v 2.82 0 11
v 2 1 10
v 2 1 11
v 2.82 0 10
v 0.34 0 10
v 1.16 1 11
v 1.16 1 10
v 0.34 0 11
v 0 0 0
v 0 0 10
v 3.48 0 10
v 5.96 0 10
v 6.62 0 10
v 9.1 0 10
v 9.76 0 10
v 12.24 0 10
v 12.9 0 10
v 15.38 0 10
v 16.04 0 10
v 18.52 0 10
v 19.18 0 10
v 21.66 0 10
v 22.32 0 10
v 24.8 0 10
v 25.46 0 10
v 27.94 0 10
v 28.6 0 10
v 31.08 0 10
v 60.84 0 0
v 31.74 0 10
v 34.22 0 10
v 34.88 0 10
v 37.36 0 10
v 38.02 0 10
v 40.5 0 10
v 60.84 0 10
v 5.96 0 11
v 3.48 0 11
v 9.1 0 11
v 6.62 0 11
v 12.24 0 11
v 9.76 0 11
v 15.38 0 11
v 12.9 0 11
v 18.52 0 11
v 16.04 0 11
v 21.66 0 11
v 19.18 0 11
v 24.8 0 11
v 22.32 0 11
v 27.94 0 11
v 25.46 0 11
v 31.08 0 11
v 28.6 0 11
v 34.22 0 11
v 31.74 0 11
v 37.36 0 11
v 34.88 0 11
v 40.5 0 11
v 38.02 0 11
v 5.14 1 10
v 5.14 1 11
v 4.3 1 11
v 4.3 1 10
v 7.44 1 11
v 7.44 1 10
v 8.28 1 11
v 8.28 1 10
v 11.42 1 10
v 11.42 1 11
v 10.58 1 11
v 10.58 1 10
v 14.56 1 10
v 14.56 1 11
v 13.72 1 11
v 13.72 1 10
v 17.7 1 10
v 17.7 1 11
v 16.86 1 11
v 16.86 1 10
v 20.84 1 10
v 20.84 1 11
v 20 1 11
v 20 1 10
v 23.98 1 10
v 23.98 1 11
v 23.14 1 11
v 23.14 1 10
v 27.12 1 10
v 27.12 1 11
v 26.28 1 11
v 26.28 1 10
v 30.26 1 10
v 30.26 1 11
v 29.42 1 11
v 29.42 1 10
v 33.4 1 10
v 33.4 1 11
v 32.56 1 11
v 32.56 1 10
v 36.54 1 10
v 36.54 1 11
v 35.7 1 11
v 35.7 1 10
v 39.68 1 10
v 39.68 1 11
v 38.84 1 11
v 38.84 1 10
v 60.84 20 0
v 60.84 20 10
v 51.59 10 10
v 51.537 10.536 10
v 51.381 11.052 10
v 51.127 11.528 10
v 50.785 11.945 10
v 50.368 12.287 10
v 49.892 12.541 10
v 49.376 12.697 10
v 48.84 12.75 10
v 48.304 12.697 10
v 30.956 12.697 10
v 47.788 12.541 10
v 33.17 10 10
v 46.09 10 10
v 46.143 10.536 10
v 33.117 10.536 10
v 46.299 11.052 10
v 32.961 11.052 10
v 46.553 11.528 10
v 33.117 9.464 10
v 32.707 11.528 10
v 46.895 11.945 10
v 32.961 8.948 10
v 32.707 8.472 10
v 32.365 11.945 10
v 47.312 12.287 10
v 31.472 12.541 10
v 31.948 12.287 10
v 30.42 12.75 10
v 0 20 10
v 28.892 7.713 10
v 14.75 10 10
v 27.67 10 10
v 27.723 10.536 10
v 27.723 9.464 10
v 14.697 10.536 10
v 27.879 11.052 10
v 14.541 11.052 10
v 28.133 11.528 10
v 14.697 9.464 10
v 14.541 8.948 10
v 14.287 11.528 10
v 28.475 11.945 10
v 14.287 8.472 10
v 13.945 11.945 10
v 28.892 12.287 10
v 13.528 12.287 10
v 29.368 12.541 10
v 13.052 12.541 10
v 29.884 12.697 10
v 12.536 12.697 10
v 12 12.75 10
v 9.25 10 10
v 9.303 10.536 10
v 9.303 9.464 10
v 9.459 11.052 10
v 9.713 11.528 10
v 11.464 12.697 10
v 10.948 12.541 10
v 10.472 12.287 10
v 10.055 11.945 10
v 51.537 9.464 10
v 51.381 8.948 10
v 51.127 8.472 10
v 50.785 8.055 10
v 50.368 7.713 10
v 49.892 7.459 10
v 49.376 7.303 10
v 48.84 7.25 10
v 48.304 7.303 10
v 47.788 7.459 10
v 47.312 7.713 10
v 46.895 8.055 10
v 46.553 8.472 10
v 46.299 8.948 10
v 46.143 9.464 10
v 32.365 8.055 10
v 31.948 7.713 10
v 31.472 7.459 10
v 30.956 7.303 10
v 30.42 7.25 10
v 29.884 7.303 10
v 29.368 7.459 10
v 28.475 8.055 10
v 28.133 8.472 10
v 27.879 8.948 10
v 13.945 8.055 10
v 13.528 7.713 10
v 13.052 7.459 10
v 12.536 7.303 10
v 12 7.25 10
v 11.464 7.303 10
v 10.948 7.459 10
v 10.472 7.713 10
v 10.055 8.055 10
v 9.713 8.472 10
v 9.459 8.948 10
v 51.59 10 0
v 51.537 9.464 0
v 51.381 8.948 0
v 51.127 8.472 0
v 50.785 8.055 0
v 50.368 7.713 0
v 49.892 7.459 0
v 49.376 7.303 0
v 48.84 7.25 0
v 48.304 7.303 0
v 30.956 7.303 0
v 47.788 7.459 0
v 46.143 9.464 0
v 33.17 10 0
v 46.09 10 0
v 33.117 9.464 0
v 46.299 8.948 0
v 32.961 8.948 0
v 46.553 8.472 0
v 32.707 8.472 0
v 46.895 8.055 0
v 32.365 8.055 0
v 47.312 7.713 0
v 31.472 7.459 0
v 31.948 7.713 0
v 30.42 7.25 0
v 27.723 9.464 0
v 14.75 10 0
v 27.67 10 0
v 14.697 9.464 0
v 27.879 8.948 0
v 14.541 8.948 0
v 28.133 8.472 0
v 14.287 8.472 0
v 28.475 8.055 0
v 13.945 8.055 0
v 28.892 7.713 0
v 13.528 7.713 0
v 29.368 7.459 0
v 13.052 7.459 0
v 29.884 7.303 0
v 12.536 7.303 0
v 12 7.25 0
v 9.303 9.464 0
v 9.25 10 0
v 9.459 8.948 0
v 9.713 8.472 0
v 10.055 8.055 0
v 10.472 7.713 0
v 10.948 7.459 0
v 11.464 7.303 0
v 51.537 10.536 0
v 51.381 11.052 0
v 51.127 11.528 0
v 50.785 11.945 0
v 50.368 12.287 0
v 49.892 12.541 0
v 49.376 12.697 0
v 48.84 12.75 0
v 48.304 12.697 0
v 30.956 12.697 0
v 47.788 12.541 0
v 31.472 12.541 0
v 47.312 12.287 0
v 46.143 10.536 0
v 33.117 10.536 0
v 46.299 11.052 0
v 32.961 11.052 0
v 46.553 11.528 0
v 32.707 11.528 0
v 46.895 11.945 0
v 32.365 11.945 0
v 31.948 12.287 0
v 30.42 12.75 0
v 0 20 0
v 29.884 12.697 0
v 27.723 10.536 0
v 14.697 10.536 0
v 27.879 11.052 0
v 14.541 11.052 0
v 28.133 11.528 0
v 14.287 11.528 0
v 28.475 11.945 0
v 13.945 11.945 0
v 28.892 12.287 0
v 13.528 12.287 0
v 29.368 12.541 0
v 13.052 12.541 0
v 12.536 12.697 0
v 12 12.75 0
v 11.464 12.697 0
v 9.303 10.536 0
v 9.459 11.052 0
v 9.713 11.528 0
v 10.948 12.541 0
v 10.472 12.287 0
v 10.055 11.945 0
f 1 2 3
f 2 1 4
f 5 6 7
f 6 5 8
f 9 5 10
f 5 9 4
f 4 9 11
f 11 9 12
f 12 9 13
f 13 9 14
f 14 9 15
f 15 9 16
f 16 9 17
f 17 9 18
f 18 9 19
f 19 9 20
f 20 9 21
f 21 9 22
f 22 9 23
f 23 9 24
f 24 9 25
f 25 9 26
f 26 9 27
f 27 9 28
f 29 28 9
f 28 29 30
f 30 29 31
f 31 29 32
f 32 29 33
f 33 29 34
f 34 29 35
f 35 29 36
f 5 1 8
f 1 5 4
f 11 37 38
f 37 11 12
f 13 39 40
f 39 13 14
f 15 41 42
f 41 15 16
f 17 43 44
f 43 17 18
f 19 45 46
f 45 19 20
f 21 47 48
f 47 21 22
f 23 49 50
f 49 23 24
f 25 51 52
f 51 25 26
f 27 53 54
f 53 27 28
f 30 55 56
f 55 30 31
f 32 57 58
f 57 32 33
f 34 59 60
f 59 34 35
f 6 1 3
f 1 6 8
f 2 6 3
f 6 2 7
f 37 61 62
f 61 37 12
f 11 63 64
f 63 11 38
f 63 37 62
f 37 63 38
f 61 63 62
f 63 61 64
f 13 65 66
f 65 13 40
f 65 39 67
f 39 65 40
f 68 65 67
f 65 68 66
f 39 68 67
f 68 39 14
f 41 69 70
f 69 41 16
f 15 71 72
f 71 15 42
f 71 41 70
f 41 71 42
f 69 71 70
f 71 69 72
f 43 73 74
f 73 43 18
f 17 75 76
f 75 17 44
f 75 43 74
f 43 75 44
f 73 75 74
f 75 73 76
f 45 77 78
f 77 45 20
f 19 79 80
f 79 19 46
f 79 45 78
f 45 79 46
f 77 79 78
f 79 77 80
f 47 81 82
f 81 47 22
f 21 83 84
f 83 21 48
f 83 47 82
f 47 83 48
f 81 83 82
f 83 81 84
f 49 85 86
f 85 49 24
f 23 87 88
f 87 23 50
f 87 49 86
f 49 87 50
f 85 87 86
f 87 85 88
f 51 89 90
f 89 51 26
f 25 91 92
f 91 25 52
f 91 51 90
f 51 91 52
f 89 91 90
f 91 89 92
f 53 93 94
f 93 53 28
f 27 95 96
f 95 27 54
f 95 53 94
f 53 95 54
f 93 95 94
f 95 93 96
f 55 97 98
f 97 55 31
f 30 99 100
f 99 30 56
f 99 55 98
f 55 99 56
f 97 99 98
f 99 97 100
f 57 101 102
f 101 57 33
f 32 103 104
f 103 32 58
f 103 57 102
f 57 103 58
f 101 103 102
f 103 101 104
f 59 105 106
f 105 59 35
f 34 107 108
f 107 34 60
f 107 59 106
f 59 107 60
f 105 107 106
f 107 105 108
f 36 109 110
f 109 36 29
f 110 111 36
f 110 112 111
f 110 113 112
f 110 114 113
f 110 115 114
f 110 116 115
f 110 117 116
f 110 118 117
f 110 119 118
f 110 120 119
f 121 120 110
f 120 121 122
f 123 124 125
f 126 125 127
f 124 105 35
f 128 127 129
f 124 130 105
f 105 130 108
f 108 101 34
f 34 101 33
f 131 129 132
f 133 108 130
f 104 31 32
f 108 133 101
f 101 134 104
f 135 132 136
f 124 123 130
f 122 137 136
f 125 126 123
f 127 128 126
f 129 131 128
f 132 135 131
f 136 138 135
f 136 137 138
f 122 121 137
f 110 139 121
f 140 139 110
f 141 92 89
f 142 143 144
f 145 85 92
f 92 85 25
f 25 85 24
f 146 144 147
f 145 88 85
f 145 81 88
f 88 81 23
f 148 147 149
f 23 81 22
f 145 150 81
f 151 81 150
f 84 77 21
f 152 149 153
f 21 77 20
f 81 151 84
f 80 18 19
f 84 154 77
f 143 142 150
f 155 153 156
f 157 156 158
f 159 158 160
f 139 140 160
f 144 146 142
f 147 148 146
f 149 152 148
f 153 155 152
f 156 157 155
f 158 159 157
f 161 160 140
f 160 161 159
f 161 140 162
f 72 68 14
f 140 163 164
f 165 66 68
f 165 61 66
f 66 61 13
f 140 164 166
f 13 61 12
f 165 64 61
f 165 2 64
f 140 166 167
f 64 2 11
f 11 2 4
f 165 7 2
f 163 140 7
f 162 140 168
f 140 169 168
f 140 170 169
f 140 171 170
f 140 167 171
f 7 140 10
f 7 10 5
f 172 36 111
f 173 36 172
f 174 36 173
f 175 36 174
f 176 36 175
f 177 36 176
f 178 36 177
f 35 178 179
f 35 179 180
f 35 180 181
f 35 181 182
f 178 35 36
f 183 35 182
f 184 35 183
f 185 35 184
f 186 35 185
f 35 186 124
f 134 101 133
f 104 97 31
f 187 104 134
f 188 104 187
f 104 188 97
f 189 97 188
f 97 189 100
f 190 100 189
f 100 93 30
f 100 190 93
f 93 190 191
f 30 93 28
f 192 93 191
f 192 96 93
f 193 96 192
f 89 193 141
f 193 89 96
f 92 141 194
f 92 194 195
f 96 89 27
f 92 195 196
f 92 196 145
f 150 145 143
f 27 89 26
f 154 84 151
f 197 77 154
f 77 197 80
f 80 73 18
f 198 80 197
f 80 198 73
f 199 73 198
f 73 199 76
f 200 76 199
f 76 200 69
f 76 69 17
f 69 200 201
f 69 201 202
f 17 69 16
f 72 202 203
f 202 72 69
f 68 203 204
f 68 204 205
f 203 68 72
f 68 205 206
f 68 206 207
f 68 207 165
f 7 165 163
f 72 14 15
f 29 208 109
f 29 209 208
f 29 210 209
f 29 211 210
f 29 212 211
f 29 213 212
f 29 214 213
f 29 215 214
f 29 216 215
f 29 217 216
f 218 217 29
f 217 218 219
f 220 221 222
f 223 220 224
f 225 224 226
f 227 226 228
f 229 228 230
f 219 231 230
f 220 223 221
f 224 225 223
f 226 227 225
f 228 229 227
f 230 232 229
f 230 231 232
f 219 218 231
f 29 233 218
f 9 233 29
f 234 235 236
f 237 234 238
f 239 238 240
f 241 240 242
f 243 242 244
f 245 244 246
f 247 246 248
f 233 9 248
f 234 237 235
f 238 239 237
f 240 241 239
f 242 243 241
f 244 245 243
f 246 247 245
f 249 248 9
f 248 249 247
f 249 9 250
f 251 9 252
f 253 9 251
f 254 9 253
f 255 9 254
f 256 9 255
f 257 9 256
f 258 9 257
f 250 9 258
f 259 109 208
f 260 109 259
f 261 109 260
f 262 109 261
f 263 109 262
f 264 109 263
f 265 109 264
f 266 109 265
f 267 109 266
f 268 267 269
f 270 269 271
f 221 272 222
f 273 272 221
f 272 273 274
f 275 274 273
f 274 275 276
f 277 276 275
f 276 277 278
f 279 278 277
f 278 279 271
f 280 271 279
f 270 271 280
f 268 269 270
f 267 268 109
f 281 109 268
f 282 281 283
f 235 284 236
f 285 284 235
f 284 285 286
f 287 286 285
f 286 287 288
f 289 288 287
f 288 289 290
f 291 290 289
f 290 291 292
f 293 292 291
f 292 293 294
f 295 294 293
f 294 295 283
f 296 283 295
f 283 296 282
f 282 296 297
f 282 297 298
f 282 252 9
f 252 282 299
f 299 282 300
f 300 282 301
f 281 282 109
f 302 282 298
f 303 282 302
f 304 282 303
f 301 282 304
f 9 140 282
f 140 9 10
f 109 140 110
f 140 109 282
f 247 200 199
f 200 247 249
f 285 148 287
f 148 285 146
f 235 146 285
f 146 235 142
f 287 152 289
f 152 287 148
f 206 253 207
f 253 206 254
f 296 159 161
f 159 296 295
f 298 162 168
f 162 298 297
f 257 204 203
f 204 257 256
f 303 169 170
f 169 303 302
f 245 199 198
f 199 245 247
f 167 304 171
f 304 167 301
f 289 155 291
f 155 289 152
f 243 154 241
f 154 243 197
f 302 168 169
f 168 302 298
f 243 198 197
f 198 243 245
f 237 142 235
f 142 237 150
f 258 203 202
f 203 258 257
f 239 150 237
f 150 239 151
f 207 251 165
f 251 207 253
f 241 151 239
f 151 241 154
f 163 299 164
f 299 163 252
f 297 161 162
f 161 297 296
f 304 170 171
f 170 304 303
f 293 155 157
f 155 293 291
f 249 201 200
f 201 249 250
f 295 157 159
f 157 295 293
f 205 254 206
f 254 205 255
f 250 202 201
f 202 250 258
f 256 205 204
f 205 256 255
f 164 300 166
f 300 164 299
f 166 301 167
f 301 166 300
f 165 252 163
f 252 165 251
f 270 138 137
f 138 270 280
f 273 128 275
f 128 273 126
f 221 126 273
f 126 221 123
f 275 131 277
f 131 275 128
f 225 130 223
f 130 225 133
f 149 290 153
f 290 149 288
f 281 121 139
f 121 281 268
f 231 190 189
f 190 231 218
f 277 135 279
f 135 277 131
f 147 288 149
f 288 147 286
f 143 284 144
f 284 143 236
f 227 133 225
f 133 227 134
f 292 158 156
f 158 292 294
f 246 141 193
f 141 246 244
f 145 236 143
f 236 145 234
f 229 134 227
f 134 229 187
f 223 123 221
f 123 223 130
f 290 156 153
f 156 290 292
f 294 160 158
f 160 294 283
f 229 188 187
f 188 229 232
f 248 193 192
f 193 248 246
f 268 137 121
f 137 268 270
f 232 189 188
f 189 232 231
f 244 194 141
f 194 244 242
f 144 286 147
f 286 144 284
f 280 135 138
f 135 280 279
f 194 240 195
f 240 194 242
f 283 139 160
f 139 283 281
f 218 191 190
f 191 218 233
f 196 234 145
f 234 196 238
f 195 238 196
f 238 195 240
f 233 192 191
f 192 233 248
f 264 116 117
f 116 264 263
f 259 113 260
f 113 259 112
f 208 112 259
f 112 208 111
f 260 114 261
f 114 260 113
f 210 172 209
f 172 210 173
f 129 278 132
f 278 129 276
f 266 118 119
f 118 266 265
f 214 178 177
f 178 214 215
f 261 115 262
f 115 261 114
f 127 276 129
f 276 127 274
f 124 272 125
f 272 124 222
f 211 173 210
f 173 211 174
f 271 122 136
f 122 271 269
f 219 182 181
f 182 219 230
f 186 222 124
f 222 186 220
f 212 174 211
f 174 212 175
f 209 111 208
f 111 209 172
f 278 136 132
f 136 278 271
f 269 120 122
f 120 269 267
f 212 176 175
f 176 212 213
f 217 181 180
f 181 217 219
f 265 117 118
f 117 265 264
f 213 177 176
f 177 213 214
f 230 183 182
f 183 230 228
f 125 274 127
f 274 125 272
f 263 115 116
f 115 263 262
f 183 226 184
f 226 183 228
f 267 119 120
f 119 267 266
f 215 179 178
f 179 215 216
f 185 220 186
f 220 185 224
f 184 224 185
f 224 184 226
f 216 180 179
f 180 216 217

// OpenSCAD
$fn = 32;

// ----------------------------------------------------------------------
// Gear rack: m=1 z=13, 60.84 x 20 x 11 mm
// ----------------------------------------------------------------------

// --- parameters (mm) ---
rack_len = 60.84;         // rack length, X
rack_w = 20;              // rack width, Y
rack_h = 11;              // overall height, Z
modul = 1;                // module
body_t = 10;              // tooth root line height
pitch = 3.14;             // circular pitch
tip_w = 0.84;             // tooth thickness at the tip
root_w = 2.48;            // tooth thickness at the root line
hole_d = 5.5;             // mounting hole
sink = 0.6;               // tooth root overlap into the body

tooth_span = 40.84;

module tooth(x0) {
  /* 20 deg flank profile, sunk into the body for a positive overlap */
  translate([x0, 0, body_t - sink])
    linear_extrude(height = rack_h - body_t + sink)
      polygon(points = [[-root_w / 2, 0], [root_w / 2, 0],
                        [tip_w / 2, rack_h - body_t],
                        [-tip_w / 2, rack_h - body_t]]);
}

difference() {
  union() {
    cube([rack_len, rack_w, body_t]);
    for (i = [0 : 13 - 1])
      tooth((i + 0.5) * pitch + (tooth_span - 13 * pitch) / 2);
  }
  translate([12, 10, -1]) cylinder(h = body_t + 2, d = hole_d);
  translate([30.42, 10, -1]) cylinder(h = body_t + 2, d = hole_d);
  translate([48.84, 10, -1]) cylinder(h = body_t + 2, d = hole_d);
}
